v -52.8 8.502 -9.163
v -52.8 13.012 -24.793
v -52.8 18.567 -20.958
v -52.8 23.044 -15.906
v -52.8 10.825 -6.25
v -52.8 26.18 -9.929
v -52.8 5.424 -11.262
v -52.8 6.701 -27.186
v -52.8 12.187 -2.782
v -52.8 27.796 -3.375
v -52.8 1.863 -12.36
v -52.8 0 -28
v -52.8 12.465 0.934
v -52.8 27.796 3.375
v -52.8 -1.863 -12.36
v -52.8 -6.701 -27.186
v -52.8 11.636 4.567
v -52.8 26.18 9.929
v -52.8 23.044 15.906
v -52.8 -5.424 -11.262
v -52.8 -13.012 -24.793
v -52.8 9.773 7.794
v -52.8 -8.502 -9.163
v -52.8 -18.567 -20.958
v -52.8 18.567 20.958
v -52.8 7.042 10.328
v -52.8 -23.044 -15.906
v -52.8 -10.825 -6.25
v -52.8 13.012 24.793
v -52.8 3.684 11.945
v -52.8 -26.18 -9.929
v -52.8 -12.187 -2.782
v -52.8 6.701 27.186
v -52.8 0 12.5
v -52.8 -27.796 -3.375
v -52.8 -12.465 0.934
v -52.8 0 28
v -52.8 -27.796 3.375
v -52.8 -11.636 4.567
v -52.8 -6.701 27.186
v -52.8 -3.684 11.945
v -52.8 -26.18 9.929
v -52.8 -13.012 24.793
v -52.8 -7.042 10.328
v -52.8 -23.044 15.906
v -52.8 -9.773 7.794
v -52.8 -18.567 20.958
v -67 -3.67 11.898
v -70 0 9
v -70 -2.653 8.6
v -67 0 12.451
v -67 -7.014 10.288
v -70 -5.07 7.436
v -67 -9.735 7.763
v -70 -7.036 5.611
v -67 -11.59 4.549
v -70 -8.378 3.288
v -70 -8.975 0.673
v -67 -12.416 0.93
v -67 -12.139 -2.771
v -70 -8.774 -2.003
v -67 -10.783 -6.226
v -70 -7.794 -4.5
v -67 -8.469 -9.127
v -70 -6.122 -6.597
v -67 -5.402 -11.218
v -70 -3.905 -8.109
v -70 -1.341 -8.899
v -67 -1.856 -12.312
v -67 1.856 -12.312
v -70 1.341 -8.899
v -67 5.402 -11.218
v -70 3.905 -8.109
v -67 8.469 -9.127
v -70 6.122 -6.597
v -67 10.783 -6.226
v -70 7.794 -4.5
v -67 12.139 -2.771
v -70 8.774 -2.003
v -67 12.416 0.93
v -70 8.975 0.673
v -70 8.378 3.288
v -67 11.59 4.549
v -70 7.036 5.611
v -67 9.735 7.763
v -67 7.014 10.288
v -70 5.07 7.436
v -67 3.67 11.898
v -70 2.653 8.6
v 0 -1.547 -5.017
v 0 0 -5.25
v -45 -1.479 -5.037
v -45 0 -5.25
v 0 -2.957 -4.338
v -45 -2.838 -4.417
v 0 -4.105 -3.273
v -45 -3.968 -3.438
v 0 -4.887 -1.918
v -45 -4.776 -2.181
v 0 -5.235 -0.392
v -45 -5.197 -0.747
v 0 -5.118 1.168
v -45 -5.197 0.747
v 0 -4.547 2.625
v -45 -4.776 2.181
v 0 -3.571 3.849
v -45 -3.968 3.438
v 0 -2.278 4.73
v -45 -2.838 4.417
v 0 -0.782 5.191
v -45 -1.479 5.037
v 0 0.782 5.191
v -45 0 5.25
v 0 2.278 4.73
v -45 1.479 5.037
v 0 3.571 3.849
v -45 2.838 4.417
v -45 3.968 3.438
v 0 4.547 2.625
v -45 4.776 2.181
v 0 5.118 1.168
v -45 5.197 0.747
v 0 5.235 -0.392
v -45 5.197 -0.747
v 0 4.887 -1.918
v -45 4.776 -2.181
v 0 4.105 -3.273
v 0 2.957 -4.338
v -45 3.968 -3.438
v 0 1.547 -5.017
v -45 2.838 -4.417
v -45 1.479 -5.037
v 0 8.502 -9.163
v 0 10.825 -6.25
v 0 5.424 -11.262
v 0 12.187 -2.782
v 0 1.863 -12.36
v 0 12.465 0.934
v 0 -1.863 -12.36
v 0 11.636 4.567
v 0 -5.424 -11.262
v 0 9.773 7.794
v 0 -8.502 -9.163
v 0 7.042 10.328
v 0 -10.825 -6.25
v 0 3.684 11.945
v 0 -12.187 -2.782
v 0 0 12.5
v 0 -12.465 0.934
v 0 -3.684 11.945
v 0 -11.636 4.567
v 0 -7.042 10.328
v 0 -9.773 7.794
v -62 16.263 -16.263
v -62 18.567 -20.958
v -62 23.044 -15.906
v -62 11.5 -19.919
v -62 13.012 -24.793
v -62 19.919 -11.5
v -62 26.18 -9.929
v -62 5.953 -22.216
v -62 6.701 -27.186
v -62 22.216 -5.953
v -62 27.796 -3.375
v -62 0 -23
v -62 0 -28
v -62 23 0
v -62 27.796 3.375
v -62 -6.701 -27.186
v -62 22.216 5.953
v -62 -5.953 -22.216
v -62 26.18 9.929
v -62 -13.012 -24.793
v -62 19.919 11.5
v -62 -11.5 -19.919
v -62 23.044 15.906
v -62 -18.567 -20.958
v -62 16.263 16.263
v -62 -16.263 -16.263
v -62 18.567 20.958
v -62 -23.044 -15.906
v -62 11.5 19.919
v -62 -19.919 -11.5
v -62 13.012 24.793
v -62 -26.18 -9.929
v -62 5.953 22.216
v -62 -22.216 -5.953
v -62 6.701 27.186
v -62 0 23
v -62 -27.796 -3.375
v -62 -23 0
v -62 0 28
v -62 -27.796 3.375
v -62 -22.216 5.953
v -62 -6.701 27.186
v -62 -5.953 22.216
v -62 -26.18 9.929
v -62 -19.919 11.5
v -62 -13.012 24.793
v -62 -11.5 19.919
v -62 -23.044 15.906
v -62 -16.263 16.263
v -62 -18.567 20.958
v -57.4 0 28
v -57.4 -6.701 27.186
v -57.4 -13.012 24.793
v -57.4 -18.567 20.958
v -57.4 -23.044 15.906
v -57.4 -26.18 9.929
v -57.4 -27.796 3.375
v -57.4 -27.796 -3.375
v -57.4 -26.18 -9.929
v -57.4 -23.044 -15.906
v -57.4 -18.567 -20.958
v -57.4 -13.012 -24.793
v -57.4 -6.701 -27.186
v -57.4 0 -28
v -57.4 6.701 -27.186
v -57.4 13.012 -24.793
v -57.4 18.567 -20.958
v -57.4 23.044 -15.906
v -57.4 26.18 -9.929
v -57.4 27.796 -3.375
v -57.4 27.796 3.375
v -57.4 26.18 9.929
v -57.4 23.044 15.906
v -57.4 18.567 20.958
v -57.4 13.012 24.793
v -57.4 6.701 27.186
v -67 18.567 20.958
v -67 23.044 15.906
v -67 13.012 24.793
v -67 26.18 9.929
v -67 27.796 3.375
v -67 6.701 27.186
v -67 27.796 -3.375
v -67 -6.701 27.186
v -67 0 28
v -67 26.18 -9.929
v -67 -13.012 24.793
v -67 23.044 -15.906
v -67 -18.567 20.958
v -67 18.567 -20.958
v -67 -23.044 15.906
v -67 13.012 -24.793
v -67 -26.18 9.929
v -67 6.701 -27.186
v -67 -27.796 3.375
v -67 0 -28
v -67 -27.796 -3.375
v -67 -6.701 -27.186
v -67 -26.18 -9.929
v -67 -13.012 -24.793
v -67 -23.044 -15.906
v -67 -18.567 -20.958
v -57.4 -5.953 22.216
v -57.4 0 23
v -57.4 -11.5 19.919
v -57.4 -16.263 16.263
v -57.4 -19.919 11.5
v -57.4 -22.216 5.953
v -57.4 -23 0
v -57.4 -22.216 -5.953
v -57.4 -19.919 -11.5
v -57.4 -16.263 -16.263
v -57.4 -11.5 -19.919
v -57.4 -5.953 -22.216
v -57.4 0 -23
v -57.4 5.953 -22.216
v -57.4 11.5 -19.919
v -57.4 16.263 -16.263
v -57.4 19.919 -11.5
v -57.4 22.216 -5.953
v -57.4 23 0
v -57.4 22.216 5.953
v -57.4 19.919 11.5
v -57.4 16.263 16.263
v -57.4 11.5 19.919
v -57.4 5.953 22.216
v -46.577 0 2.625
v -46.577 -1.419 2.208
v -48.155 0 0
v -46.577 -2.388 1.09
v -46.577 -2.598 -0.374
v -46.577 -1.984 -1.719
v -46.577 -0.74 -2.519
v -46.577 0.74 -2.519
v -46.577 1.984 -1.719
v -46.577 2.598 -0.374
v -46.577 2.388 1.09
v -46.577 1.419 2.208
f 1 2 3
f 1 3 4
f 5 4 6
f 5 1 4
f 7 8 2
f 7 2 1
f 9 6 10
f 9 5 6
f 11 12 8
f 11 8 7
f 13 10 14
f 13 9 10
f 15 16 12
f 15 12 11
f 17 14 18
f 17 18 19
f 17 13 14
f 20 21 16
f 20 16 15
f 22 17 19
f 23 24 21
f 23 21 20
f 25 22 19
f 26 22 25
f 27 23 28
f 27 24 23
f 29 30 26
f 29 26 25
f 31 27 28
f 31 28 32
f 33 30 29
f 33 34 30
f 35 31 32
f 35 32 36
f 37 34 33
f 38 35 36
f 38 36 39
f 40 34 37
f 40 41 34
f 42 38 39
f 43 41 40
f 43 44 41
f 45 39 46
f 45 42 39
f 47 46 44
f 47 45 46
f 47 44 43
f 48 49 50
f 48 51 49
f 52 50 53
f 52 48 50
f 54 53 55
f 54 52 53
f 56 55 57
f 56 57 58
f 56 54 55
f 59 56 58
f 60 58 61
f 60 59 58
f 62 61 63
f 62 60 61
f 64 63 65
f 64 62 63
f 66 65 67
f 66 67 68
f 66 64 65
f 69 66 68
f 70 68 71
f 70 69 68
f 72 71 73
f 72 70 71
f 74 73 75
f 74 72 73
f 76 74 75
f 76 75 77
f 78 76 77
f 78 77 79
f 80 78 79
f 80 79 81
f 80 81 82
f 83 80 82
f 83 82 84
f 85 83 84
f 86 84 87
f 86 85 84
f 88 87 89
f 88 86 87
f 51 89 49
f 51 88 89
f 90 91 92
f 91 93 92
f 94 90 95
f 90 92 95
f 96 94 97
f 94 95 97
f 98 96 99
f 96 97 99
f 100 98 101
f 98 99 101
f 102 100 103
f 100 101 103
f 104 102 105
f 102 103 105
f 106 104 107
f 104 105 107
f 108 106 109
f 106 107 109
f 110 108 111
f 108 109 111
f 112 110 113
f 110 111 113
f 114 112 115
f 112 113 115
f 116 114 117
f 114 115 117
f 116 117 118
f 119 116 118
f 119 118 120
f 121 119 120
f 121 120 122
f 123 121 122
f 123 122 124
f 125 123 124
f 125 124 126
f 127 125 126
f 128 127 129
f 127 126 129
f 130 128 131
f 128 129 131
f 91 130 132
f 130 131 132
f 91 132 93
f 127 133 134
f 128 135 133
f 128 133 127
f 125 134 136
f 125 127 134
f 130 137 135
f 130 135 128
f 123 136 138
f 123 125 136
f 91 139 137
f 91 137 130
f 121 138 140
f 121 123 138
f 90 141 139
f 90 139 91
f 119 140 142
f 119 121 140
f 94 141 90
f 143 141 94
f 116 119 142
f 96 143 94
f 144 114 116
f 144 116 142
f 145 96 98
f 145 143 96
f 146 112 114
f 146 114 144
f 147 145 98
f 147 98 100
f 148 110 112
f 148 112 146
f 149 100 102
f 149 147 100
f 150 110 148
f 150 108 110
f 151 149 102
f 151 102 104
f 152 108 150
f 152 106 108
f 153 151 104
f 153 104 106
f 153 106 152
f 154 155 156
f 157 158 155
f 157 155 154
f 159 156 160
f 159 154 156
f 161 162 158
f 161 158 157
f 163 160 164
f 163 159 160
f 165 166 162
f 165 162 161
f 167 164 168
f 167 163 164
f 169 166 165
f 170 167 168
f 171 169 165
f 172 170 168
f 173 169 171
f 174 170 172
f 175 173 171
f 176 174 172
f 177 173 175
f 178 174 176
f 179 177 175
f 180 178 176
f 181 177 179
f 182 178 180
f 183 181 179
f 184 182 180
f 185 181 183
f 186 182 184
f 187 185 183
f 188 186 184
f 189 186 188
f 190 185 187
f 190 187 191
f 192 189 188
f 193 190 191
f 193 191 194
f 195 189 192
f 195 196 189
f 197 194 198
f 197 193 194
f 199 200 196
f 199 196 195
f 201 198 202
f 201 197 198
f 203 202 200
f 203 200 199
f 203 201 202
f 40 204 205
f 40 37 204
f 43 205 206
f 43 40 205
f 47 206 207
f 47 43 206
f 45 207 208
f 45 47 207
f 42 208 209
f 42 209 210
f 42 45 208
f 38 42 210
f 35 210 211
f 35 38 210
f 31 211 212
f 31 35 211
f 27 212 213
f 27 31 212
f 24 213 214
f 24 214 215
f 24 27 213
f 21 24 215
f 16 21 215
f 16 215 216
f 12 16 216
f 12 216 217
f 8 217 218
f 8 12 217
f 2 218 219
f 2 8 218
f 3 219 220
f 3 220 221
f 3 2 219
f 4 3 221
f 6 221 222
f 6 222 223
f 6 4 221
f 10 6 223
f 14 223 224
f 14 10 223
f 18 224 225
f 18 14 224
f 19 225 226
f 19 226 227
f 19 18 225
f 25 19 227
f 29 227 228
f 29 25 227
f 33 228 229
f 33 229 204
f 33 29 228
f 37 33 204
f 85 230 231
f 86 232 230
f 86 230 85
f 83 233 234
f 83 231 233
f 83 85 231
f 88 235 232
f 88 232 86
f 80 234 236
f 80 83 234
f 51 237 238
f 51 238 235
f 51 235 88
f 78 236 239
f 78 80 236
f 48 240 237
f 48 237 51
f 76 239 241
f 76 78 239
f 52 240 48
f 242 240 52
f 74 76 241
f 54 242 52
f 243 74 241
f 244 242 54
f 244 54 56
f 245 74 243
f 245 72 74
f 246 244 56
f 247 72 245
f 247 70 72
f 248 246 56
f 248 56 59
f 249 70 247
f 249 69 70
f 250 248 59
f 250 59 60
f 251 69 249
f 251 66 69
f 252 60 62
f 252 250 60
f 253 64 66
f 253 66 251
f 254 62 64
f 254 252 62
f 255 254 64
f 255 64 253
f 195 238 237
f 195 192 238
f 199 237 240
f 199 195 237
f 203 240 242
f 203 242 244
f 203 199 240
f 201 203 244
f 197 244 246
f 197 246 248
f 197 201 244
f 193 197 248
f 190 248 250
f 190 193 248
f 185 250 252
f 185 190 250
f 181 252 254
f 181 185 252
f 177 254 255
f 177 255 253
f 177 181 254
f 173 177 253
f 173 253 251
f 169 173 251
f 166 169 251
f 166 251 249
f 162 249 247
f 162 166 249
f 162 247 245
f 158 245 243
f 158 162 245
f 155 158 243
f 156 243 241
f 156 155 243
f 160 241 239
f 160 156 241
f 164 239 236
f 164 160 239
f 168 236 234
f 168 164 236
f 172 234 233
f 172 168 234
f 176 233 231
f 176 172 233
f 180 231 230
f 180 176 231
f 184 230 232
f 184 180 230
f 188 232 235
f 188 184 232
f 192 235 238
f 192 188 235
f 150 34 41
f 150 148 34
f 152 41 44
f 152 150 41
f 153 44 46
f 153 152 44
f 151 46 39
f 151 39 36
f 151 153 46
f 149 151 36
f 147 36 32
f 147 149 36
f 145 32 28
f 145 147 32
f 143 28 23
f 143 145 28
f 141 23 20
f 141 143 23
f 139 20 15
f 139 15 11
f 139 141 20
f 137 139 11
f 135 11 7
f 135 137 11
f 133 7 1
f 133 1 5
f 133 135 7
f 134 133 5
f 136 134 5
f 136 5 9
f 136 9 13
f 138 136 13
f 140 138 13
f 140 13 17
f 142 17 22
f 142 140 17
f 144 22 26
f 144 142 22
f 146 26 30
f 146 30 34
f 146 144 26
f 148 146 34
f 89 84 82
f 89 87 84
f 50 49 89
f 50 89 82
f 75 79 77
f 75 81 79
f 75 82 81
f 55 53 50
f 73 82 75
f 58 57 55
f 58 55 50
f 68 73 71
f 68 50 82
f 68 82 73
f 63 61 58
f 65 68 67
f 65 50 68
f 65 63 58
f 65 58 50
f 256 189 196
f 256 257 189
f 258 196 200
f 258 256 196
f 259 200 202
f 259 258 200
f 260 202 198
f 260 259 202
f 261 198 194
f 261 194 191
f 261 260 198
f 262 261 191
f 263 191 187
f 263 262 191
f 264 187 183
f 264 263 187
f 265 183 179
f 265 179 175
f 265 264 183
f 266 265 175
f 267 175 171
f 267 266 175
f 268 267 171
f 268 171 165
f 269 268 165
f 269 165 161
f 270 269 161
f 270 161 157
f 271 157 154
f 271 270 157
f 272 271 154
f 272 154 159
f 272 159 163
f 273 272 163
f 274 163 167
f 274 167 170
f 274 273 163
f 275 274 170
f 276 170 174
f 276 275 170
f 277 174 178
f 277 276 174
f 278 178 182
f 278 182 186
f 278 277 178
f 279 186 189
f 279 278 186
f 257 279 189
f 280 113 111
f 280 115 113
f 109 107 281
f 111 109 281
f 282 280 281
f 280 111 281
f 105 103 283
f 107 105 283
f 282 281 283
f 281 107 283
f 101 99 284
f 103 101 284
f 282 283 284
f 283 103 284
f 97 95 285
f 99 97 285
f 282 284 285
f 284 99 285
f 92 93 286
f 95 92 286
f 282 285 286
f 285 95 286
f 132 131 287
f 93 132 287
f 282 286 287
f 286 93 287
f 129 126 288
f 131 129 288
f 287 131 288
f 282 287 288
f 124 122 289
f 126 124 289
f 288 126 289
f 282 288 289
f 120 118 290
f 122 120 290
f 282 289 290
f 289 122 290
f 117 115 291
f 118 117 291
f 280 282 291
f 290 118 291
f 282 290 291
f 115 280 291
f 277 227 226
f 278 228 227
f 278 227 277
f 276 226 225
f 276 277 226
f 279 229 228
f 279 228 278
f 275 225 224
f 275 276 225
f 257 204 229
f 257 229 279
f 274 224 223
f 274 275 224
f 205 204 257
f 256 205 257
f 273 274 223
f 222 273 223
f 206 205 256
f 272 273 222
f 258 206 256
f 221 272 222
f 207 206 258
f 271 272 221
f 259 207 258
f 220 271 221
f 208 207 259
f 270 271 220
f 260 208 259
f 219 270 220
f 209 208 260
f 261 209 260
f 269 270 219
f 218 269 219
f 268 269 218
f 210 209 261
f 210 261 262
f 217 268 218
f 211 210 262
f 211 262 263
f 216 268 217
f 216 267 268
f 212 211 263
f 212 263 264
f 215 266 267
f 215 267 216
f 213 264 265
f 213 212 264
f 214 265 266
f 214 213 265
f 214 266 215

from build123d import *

# Parameters (mm, degrees)
M12X1_51_D     = 10.5
M12X1_51_DEPTH = 45
M12X1_51_TIP   = 3.15451825


with BuildPart() as part:
    # Эскиз1 → Повернуть1 (revolve)
    with BuildSketch(Plane.XY, mode=Mode.PRIVATE) as revolve_1_sk:
        Polygon((0, 0), (-70, 0), (-70, -9), (-67, -12.451105222), (-67, -28), (-62, -28), (-62, -23), (-57.4, -23), (-57.4, -28), (-52.8, -28), (-52.8, -12.5), (0, -12.5), align=None)
    revolve(revolve_1_sk.sketch.rotate(Axis((-541.044005746, 0, 0), (1, 0, 0)), 270), axis=Axis((-541.044005746, 0, 0), (1, 0, 0)))

    # Сверление под метчик M12x1.51
    with Locations(Plane(origin=(0, 0, 0), x_dir=(0, 0, 1), z_dir=(1, 0, 0))):
        with Locations((0, 0)):
            Hole(M12X1_51_D / 2, depth=M12X1_51_DEPTH)
            with Locations((0, 0, -(M12X1_51_DEPTH + M12X1_51_TIP / 2))):  # 118° drill point
                Cone(0, M12X1_51_D / 2, M12X1_51_TIP, mode=Mode.SUBTRACT)


solid = part.part
